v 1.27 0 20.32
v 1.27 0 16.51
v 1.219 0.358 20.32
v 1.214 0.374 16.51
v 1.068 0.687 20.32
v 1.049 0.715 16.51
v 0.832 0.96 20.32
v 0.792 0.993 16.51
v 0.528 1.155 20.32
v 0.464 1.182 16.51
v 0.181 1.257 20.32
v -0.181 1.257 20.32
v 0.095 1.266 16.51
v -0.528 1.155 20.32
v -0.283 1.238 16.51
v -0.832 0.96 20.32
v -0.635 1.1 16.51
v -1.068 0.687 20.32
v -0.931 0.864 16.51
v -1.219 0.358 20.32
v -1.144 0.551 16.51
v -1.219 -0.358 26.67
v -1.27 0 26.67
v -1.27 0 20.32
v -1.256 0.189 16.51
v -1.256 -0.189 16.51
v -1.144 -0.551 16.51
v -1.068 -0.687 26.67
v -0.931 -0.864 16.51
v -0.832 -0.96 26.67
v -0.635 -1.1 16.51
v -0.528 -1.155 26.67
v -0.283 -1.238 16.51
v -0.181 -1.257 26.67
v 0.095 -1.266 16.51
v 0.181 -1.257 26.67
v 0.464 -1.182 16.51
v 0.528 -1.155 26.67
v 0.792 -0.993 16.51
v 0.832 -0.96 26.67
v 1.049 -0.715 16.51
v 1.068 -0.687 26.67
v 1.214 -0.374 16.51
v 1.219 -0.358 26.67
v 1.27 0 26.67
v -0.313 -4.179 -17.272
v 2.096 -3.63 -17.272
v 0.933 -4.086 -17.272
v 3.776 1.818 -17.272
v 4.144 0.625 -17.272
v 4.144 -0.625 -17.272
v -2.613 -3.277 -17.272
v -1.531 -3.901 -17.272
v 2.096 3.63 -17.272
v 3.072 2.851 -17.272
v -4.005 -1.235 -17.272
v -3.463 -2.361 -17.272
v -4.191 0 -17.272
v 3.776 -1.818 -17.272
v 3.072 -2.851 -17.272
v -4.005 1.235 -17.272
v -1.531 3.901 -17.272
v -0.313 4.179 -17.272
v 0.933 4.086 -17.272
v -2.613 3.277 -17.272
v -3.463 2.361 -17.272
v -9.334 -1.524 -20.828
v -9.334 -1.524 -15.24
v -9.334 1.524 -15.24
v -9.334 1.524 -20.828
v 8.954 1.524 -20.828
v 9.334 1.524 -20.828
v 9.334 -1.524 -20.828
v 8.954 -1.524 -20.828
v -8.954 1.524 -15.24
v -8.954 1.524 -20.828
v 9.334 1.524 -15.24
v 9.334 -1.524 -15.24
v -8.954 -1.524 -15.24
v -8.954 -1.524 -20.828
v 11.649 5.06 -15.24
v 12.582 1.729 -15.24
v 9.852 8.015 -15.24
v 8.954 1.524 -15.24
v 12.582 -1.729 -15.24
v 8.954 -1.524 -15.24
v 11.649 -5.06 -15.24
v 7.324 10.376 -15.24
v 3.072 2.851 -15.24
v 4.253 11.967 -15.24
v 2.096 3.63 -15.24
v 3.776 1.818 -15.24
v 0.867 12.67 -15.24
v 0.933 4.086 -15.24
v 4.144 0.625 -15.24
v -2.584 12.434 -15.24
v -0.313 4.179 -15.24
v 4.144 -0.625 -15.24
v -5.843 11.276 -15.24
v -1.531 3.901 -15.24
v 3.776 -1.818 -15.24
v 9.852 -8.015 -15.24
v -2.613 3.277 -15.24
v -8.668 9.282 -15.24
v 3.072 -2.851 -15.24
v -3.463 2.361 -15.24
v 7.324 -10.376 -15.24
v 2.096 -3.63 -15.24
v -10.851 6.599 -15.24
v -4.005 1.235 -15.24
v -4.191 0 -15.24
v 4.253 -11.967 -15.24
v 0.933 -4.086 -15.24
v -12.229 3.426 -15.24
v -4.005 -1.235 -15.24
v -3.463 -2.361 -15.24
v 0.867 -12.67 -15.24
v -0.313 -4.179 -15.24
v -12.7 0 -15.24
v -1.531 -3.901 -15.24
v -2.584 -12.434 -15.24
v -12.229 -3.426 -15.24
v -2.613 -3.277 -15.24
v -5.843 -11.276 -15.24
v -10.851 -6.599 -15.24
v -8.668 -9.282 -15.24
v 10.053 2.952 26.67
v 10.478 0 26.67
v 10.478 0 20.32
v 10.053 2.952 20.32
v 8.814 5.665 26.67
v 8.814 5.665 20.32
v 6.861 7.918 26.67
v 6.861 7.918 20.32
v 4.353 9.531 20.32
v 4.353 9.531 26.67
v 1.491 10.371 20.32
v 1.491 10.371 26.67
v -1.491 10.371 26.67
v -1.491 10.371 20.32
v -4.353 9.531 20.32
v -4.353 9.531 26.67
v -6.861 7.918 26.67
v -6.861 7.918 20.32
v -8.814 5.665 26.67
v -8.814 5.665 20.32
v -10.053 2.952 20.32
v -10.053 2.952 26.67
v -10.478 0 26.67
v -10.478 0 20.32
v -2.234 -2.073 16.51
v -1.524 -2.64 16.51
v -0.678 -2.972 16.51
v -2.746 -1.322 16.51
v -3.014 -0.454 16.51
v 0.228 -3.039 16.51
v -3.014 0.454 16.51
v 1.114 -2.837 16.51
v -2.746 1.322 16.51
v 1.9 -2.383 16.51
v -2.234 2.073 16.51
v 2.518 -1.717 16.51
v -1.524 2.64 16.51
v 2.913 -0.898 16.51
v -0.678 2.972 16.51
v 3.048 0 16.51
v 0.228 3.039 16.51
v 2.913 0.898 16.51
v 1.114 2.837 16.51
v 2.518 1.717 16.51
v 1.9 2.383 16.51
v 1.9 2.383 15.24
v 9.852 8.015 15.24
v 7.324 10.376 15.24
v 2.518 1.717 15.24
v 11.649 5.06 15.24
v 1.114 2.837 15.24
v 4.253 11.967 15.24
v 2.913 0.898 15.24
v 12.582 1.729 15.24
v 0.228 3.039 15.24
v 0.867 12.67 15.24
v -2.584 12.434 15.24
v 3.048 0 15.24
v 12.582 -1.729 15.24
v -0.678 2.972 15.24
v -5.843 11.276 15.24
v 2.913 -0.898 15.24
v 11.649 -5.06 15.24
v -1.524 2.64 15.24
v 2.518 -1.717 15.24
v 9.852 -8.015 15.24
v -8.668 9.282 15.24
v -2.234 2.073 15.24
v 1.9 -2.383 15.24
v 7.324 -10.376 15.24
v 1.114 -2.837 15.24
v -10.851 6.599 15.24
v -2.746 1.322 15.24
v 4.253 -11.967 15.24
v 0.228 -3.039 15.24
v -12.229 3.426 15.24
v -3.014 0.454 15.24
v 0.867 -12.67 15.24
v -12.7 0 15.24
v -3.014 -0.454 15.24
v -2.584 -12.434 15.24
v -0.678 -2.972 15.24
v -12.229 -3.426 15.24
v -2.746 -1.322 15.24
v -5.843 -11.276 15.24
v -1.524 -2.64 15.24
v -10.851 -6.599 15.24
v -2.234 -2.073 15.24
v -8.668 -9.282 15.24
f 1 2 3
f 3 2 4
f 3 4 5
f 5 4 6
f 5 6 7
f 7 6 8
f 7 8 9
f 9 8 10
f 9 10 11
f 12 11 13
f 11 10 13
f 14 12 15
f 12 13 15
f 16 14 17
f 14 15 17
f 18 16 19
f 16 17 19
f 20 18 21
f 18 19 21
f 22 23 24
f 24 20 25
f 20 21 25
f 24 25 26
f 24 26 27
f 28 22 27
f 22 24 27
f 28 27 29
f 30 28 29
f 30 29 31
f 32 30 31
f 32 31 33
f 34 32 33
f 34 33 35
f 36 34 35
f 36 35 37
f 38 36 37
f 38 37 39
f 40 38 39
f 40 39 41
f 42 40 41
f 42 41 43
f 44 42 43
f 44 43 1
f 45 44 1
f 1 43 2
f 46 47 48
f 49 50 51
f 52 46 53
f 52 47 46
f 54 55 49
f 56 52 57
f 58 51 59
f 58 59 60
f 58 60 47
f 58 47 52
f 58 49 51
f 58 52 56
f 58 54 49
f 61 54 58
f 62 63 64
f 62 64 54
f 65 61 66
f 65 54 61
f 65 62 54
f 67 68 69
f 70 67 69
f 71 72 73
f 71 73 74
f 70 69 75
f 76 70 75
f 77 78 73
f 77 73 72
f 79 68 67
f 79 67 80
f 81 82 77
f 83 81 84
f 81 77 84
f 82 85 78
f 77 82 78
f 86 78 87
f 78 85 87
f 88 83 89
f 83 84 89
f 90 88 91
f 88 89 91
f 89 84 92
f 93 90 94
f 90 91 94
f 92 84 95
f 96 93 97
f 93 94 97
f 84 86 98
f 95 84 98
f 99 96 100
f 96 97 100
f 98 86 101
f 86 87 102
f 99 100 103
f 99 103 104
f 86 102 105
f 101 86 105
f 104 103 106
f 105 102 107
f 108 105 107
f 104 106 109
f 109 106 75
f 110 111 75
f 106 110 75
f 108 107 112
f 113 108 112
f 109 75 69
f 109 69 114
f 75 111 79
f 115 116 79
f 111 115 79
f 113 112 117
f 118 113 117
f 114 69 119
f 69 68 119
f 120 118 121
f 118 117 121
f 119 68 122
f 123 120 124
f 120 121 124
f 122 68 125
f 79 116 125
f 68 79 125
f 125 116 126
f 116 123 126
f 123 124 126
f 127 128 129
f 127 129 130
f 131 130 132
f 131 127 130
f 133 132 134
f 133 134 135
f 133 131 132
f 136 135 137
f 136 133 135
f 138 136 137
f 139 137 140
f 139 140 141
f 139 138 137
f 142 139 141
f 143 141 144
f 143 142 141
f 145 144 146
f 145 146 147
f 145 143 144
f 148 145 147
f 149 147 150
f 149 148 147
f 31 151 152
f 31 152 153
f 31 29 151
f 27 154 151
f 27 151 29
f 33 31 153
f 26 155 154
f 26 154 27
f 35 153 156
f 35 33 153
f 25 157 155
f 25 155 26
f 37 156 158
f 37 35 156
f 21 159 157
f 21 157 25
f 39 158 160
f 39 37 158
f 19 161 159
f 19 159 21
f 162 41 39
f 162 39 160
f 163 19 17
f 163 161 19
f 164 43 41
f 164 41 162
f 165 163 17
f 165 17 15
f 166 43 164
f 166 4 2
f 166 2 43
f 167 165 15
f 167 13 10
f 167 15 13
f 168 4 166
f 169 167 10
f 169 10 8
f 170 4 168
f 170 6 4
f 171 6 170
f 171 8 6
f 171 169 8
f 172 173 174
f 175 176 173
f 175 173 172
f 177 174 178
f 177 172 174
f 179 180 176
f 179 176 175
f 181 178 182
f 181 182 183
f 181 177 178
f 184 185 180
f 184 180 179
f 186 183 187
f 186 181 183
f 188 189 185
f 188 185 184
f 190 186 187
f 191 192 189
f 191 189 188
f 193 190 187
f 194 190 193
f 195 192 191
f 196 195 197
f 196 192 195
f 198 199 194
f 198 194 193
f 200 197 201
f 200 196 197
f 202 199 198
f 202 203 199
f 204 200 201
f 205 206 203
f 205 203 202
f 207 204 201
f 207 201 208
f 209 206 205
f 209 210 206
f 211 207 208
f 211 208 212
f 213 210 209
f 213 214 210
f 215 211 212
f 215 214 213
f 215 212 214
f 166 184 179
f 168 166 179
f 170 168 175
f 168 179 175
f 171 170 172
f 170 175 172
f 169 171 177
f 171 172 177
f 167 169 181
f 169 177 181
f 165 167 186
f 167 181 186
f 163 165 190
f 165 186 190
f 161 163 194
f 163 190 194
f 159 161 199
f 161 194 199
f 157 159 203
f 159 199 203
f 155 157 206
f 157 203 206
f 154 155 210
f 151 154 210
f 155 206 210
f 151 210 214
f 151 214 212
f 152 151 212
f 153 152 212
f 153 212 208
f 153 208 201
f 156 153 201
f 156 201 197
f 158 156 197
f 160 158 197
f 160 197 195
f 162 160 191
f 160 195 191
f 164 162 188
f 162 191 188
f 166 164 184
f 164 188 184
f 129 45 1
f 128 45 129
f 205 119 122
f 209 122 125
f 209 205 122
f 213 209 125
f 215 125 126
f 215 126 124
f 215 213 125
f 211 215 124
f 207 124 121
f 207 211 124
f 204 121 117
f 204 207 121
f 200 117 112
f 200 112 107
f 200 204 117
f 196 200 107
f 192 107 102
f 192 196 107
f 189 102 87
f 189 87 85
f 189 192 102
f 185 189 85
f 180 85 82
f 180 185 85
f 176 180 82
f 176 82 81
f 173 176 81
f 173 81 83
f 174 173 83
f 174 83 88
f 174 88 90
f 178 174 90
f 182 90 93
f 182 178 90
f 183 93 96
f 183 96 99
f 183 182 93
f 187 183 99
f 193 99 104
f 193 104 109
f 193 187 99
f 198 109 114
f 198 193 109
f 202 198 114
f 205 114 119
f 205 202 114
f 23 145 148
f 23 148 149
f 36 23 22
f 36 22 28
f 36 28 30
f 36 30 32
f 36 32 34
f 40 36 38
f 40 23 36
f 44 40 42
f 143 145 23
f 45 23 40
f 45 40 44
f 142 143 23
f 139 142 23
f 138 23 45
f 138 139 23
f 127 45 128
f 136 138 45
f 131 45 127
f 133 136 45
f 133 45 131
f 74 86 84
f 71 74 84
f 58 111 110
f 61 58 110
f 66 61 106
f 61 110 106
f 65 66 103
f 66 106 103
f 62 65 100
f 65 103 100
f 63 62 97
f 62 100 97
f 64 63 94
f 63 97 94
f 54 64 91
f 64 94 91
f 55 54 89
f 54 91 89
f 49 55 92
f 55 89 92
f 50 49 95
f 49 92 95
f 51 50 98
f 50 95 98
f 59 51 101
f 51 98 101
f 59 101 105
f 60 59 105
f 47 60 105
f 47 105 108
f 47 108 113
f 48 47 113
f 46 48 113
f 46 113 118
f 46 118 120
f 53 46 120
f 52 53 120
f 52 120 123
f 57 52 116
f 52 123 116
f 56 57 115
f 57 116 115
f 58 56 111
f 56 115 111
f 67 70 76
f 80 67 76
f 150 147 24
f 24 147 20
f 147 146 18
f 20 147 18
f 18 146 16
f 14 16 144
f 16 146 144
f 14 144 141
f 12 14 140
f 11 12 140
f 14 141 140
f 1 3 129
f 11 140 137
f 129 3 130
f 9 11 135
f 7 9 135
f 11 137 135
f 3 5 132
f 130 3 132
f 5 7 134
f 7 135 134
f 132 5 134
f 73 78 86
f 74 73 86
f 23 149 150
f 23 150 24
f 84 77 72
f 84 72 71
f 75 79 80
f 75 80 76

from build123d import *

# Parameters (mm, degrees)
SKETCH1_R           = 12.7
BOSS_EXTRUDE1_DEPTH = 15.24
SKETCH2_R           = 3.048
BOSS_EXTRUDE2_DEPTH = 1.27
SKETCH3_R           = 1.27
BOSS_EXTRUDE3_DEPTH = 10.16
BOSS_EXTRUDE4_DEPTH = 6.35
SKETCH5_R           = 4.191
BOSS_EXTRUDE5_DEPTH = 2.032
SKETCH6_W           = 0.381
SKETCH6_H           = 3.048
BOSS_EXTRUDE6_DEPTH = 5.588


with BuildPart() as part:
    # Sketch1 → Boss-Extrude1 (new, symmetric)
    with BuildSketch(Plane.XY):
        with Locations(Location((0, 0, 0), (0, 0, 180))):
            Circle(SKETCH1_R)
    extrude(amount=BOSS_EXTRUDE1_DEPTH, both=True)

    # Sketch2 → Boss-Extrude2 (add)
    with BuildSketch(Plane.XY.offset(15.24)):
        Circle(SKETCH2_R)
    extrude(amount=BOSS_EXTRUDE2_DEPTH)

    # Sketch3 → Boss-Extrude3 (add)
    with BuildSketch(Plane.XY.offset(16.51)):
        Circle(SKETCH3_R)
    extrude(amount=BOSS_EXTRUDE3_DEPTH)

    # Sketch4 → Boss-Extrude4 (add)
    with BuildSketch(Plane.XY.offset(26.67)):
        with BuildLine():
            Line((-10.4775, 0), (10.4775, 0))
            ThreePointArc((10.4775, 0), (0, 10.4775), (-10.4775, 0))
        make_face()
    extrude(amount=-BOSS_EXTRUDE4_DEPTH)

    # Sketch5 → Boss-Extrude5 (add)
    with BuildSketch(Plane(origin=(0, 0, -15.24), x_dir=(-1, 0, 0), z_dir=(0, 0, -1))):
        Circle(SKETCH5_R)
    extrude(amount=BOSS_EXTRUDE5_DEPTH)

    # Sketch6 → Boss-Extrude6 (add)
    with BuildSketch(Plane(origin=(0, 0, -15.24), x_dir=(-1, 0, 0), z_dir=(0, 0, -1))):
        with Locations((-9.144, 0)):
            Rectangle(SKETCH6_W, SKETCH6_H)
    boss_extrude6 = extrude(amount=BOSS_EXTRUDE6_DEPTH)

    # Mirror1: Boss-Extrude6 across plane
    add(boss_extrude6.mirror(Plane(origin=(0, 0, 0), x_dir=(0, 0, 1), z_dir=(1, 0, 0))))


solid = part.part
